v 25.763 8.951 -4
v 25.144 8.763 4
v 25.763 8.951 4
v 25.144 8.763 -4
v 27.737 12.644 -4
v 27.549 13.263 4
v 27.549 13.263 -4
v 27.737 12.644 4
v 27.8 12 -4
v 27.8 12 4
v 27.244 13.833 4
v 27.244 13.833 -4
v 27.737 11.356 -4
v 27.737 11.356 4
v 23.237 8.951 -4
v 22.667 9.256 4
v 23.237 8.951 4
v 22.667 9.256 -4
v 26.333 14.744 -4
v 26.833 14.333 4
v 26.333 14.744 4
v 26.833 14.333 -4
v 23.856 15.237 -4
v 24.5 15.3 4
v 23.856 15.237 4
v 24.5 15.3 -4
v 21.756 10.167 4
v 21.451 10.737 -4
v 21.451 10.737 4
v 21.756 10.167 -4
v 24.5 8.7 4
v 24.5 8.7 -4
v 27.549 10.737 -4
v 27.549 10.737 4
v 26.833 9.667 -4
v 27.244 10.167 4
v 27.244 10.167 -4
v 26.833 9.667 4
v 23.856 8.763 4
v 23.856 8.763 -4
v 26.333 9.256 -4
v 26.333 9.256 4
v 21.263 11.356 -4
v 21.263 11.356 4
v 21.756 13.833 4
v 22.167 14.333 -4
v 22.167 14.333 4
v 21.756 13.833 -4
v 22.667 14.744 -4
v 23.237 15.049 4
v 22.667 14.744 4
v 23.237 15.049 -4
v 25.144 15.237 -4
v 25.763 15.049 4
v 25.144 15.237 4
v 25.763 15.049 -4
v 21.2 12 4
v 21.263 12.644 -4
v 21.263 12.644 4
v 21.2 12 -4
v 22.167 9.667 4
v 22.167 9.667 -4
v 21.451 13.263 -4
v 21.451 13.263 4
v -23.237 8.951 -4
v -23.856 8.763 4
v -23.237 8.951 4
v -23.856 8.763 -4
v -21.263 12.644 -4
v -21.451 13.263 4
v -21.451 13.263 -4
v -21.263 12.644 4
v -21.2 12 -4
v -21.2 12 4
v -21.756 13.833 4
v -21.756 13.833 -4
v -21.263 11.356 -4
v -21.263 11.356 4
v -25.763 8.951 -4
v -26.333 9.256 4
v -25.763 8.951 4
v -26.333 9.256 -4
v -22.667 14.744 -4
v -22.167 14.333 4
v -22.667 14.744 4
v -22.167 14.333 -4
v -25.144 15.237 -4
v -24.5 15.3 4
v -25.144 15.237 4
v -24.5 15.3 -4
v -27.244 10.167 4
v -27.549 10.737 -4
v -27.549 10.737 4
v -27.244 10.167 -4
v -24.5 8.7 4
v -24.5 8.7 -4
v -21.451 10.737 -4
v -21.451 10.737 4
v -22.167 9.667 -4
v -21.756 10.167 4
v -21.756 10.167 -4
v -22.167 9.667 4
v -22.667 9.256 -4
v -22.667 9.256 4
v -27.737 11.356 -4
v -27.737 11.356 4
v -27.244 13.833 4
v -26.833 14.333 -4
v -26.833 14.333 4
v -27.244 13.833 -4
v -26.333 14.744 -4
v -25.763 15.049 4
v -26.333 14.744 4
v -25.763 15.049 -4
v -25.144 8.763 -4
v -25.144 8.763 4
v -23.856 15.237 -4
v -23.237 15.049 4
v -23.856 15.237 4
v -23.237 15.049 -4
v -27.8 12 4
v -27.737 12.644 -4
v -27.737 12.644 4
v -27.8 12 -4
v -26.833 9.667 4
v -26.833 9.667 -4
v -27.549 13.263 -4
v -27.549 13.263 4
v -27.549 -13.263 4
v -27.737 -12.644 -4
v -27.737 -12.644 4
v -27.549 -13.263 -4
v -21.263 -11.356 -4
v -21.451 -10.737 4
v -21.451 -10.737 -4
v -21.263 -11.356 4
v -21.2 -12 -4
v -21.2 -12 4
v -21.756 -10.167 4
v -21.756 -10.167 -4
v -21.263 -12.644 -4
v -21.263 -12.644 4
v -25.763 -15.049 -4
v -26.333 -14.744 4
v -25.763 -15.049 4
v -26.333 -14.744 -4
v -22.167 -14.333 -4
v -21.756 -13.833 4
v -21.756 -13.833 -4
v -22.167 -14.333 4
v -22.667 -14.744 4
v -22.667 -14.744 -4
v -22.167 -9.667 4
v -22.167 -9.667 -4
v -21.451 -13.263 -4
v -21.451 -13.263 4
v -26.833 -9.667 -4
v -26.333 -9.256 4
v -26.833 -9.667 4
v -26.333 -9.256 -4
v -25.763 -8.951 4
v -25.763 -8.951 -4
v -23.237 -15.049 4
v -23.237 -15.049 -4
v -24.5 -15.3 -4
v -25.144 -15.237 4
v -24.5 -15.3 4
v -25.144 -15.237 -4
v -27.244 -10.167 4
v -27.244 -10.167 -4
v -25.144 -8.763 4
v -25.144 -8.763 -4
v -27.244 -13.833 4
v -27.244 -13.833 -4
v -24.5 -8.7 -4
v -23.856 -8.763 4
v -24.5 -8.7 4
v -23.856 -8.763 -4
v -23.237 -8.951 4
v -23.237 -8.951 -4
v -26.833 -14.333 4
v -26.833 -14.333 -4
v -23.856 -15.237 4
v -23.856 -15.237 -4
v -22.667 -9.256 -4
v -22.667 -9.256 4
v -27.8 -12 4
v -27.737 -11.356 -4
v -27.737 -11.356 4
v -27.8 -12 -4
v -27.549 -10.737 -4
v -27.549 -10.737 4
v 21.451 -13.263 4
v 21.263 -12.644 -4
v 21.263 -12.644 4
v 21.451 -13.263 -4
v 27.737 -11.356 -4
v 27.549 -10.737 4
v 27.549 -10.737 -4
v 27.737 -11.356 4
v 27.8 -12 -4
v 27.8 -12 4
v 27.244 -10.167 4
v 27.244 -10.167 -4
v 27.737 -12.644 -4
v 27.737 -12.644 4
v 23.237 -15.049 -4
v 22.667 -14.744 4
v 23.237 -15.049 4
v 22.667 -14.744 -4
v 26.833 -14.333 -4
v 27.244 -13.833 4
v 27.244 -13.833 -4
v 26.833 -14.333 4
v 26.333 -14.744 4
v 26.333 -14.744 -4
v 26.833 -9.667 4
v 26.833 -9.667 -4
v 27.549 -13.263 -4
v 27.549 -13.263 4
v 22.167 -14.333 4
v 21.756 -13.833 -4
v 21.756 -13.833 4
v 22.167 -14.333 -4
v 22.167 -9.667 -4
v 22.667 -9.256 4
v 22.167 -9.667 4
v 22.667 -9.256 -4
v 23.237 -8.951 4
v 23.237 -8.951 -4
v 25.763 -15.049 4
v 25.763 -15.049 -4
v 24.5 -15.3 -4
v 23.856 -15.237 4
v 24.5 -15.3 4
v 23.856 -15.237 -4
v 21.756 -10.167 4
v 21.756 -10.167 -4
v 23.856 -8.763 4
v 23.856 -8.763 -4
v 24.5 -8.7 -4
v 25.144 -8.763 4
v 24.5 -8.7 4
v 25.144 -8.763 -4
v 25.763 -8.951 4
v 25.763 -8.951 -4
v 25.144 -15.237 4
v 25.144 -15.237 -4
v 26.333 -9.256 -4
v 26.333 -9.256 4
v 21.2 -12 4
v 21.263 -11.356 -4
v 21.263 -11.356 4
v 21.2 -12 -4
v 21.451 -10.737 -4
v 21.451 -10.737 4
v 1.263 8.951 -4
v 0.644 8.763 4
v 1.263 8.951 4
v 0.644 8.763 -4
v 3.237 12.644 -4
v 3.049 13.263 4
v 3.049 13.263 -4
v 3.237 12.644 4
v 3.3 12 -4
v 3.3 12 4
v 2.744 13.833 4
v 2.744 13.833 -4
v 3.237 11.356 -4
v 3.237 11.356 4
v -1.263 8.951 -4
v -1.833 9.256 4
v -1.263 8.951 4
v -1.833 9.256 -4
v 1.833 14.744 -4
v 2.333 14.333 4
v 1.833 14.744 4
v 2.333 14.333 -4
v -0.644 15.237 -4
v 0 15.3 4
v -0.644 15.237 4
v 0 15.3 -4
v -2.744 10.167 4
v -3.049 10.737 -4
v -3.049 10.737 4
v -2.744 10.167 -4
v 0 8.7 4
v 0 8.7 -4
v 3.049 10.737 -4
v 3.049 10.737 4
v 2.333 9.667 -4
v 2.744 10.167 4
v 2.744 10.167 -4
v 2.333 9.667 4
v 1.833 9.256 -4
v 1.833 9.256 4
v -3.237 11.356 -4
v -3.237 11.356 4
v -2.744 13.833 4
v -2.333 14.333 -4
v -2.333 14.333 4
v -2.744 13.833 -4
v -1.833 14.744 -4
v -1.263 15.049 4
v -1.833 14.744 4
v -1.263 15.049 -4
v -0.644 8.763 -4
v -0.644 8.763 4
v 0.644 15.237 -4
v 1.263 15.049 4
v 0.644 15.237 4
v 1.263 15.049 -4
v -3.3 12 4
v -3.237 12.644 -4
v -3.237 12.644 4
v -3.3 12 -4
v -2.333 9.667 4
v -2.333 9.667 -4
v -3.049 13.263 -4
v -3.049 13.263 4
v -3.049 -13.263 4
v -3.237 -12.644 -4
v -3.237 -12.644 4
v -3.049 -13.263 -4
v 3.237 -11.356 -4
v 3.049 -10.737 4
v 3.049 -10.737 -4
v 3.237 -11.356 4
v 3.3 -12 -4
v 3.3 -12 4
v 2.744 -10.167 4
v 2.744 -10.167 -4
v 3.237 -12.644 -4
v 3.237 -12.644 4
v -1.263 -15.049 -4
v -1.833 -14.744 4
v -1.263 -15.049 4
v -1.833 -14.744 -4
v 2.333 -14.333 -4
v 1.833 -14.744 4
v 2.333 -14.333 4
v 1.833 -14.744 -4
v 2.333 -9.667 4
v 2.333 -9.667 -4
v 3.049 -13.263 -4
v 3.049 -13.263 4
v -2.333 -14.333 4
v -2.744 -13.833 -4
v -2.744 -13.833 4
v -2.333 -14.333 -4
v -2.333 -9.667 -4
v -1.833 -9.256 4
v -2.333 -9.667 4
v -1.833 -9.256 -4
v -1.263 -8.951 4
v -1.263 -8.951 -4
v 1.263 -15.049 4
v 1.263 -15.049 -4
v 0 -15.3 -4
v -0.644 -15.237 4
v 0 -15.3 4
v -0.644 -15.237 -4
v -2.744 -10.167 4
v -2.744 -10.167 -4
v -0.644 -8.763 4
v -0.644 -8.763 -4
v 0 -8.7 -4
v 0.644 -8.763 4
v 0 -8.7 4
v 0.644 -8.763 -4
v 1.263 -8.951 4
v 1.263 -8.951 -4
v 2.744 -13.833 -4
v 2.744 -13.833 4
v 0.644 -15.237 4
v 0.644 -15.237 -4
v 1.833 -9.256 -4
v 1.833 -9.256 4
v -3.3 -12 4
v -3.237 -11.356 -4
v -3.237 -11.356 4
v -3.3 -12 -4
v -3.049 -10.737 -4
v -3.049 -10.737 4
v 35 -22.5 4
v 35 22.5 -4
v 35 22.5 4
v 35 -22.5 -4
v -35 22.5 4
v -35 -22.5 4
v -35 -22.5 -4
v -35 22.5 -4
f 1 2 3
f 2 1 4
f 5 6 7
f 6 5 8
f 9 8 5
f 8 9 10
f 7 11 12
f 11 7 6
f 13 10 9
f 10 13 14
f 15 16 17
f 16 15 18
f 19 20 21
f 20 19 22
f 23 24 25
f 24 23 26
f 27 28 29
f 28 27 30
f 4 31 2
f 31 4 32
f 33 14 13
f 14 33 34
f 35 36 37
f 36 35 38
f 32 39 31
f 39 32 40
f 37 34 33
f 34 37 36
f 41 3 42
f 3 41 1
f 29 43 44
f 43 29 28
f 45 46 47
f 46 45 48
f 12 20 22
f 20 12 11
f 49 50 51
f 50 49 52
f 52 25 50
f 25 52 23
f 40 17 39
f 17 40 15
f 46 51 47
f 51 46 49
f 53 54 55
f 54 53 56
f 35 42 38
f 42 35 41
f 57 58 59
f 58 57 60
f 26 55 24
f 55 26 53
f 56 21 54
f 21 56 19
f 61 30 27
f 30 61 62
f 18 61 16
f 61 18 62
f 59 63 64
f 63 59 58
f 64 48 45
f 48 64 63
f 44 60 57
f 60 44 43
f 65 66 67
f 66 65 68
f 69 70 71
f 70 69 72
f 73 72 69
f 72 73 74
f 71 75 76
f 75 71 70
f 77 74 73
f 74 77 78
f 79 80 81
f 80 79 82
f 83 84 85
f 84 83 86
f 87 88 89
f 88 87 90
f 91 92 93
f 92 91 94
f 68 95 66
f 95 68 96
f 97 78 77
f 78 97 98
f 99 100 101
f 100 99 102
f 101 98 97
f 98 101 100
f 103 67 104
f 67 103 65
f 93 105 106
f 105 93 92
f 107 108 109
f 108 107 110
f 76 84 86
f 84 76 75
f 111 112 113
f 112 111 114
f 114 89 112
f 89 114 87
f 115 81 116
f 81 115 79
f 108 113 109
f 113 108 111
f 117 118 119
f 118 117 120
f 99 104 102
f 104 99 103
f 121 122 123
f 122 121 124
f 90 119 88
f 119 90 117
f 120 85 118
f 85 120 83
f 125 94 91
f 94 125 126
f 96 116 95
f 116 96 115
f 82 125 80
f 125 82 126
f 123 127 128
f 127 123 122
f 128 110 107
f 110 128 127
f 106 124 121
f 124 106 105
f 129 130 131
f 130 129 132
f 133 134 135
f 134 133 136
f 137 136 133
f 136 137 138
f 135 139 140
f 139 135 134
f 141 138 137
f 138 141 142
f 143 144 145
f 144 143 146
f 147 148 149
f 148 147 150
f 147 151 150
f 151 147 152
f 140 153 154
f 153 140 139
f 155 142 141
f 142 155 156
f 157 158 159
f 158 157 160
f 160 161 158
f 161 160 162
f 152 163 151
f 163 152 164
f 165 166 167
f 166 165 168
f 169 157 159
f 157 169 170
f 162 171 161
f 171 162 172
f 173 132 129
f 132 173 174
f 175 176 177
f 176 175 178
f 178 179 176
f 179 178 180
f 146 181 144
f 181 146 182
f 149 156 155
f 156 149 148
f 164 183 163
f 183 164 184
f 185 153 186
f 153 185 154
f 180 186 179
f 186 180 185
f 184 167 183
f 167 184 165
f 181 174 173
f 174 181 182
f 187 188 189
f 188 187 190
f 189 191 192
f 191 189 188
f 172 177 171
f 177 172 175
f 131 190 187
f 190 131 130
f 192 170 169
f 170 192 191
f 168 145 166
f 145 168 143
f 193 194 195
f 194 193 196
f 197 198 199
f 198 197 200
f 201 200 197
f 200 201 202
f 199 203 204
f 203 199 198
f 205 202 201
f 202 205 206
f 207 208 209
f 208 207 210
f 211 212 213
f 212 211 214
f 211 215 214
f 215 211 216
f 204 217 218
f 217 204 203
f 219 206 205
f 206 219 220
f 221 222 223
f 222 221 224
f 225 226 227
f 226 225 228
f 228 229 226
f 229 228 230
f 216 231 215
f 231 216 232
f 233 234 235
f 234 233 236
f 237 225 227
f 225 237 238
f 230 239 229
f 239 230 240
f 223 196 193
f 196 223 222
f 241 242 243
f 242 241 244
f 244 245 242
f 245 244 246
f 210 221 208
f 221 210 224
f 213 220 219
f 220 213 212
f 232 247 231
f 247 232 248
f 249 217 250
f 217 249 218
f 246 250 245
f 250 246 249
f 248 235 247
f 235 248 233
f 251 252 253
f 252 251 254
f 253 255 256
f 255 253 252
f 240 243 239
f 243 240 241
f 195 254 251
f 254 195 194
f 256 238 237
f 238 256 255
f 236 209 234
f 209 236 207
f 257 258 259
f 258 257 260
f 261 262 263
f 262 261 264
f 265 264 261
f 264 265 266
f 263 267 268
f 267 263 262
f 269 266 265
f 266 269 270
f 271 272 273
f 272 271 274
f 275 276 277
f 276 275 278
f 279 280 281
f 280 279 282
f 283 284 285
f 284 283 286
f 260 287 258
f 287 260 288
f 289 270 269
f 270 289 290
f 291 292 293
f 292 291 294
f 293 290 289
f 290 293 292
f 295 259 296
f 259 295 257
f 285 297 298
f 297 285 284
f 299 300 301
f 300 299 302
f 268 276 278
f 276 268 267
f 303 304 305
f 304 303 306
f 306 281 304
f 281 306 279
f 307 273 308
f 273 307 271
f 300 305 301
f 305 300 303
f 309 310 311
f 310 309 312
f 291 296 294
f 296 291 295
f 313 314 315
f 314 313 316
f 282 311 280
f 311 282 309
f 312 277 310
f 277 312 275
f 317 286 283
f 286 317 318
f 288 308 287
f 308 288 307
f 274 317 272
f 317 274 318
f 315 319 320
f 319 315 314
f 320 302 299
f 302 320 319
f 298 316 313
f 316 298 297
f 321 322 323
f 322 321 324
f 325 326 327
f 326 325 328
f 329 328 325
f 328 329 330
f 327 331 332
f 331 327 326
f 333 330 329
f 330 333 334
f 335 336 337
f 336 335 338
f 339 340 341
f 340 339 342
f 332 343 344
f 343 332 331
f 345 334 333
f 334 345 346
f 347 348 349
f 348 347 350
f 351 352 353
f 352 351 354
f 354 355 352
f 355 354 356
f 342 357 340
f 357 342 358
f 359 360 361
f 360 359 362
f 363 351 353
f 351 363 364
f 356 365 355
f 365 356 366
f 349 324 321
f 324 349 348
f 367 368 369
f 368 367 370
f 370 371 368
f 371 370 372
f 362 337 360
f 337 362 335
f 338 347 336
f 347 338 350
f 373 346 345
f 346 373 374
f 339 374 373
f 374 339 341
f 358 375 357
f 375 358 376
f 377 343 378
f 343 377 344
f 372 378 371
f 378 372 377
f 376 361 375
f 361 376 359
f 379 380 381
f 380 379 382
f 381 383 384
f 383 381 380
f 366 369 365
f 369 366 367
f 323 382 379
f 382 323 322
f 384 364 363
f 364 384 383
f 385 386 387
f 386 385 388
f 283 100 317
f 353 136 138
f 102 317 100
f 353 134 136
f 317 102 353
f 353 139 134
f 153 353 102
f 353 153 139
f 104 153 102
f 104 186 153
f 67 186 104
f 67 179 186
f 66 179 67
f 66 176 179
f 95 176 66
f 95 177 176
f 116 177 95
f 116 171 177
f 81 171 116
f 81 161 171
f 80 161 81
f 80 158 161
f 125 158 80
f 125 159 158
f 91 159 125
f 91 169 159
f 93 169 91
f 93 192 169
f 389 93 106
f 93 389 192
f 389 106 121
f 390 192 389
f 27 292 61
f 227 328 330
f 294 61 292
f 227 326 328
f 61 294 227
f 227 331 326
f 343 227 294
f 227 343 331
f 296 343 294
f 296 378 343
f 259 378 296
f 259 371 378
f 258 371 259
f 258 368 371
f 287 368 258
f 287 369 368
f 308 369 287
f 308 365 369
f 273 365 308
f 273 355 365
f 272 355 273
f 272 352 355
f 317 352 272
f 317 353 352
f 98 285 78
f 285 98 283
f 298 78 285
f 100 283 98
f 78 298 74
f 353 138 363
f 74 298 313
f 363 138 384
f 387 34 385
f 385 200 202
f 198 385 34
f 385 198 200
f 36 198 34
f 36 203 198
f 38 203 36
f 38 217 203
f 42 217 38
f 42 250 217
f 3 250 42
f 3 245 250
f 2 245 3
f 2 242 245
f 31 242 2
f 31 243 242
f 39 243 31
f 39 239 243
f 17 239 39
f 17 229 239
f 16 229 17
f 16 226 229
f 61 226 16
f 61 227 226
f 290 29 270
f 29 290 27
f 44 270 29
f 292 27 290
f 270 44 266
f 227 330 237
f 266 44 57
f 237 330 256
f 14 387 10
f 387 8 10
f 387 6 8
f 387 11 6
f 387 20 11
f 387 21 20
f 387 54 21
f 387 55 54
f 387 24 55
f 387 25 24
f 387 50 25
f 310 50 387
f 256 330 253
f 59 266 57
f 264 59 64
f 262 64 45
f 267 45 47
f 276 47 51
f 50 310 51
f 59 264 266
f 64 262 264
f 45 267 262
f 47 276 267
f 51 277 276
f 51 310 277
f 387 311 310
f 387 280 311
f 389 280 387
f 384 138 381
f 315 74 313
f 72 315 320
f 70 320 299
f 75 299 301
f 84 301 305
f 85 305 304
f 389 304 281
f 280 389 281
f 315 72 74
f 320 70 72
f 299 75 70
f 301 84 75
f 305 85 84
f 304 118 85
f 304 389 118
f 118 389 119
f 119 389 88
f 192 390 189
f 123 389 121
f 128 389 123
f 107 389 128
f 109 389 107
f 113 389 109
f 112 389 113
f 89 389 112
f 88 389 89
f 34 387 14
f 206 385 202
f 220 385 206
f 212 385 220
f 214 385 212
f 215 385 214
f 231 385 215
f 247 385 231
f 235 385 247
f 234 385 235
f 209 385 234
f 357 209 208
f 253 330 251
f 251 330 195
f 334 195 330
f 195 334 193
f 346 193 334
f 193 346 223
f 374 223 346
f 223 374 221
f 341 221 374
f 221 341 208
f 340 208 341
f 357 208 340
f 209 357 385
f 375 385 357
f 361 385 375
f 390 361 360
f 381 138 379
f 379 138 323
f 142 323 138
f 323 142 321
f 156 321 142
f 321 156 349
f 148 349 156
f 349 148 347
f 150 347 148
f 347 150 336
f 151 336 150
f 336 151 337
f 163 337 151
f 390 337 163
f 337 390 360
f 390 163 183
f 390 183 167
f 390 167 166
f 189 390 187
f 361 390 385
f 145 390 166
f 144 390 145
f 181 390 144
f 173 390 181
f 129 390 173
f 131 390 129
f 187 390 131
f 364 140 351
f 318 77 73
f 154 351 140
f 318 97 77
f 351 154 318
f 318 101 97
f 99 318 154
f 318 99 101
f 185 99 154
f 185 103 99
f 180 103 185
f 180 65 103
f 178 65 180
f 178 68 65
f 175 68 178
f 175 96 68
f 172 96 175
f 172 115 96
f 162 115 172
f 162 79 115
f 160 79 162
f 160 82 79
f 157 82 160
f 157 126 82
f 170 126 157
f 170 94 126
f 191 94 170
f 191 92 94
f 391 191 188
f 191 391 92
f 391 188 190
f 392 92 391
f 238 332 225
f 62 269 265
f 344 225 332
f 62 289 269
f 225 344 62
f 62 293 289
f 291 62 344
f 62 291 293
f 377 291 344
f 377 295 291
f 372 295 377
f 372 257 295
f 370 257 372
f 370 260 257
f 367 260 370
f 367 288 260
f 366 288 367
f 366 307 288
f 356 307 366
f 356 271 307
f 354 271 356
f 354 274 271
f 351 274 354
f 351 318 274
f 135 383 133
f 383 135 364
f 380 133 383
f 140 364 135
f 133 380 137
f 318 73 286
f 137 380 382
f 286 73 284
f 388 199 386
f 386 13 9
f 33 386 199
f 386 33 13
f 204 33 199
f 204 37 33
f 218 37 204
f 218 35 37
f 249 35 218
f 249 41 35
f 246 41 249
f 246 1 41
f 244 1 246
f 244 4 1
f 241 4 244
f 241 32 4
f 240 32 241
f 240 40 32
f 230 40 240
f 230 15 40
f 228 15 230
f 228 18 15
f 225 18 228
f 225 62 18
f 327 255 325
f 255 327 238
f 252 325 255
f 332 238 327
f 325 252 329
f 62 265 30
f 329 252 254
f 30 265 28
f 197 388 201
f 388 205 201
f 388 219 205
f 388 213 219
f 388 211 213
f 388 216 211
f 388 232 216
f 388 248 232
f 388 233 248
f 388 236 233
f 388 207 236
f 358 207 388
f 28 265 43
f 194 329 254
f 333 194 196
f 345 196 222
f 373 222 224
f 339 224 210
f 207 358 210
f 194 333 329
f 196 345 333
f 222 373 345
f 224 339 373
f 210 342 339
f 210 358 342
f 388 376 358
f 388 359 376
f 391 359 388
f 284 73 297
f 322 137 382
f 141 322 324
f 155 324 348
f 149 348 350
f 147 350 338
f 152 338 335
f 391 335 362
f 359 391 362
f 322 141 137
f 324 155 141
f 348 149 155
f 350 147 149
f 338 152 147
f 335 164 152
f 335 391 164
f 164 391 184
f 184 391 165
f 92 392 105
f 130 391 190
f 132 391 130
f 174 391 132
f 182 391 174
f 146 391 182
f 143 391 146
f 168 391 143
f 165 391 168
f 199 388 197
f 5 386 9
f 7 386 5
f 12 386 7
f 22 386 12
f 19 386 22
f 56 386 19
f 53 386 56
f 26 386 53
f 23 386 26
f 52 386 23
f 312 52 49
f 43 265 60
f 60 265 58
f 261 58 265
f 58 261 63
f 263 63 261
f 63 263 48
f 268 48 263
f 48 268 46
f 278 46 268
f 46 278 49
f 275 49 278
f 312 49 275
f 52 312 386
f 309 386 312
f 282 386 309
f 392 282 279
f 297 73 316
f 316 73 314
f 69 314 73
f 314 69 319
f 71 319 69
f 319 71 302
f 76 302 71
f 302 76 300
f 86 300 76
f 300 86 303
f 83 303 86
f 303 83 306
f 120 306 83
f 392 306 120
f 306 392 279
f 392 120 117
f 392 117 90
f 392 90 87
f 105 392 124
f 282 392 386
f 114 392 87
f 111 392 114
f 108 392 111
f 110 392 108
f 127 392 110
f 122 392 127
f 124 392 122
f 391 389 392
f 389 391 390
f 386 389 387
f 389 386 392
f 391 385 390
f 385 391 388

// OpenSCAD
$fn = 32;

// ----------------------------------------------------------------------
// Corner plate 70 x 45 x 8
// 6 holes, centres taken from the edge offset
// ----------------------------------------------------------------------

// --- parameters (mm) ---
plate = [70, 45, 8];  // overall size (x, y, z)
holes = 6;            // number of holes the drawing asks for
hole_d = 6.6;         // hole diameter
edge = 10.5;          // hole centre offset from the plate edge

// --- derived feature positions (mm) ---
corner_x = plate[0] / 2 - edge;  // = 24.5   corner hole X
corner_y = plate[1] / 2 - edge;  // = 12   corner hole Y
feature_centers = [
  [corner_x, corner_y],
  [-corner_x, corner_y],
  [-corner_x, -corner_y],
  [corner_x, -corner_y],
  [0, corner_y],
  [0, -corner_y]
];   // hole centres the loop below drills

// plate outline, every hole drilled through with the same cutters
difference() {
  cube(plate, center = true);
  for (centre = feature_centers)
    translate([centre[0], centre[1], 0])
      cylinder(d = hole_d, h = plate[2] + 2, center = true);
}
